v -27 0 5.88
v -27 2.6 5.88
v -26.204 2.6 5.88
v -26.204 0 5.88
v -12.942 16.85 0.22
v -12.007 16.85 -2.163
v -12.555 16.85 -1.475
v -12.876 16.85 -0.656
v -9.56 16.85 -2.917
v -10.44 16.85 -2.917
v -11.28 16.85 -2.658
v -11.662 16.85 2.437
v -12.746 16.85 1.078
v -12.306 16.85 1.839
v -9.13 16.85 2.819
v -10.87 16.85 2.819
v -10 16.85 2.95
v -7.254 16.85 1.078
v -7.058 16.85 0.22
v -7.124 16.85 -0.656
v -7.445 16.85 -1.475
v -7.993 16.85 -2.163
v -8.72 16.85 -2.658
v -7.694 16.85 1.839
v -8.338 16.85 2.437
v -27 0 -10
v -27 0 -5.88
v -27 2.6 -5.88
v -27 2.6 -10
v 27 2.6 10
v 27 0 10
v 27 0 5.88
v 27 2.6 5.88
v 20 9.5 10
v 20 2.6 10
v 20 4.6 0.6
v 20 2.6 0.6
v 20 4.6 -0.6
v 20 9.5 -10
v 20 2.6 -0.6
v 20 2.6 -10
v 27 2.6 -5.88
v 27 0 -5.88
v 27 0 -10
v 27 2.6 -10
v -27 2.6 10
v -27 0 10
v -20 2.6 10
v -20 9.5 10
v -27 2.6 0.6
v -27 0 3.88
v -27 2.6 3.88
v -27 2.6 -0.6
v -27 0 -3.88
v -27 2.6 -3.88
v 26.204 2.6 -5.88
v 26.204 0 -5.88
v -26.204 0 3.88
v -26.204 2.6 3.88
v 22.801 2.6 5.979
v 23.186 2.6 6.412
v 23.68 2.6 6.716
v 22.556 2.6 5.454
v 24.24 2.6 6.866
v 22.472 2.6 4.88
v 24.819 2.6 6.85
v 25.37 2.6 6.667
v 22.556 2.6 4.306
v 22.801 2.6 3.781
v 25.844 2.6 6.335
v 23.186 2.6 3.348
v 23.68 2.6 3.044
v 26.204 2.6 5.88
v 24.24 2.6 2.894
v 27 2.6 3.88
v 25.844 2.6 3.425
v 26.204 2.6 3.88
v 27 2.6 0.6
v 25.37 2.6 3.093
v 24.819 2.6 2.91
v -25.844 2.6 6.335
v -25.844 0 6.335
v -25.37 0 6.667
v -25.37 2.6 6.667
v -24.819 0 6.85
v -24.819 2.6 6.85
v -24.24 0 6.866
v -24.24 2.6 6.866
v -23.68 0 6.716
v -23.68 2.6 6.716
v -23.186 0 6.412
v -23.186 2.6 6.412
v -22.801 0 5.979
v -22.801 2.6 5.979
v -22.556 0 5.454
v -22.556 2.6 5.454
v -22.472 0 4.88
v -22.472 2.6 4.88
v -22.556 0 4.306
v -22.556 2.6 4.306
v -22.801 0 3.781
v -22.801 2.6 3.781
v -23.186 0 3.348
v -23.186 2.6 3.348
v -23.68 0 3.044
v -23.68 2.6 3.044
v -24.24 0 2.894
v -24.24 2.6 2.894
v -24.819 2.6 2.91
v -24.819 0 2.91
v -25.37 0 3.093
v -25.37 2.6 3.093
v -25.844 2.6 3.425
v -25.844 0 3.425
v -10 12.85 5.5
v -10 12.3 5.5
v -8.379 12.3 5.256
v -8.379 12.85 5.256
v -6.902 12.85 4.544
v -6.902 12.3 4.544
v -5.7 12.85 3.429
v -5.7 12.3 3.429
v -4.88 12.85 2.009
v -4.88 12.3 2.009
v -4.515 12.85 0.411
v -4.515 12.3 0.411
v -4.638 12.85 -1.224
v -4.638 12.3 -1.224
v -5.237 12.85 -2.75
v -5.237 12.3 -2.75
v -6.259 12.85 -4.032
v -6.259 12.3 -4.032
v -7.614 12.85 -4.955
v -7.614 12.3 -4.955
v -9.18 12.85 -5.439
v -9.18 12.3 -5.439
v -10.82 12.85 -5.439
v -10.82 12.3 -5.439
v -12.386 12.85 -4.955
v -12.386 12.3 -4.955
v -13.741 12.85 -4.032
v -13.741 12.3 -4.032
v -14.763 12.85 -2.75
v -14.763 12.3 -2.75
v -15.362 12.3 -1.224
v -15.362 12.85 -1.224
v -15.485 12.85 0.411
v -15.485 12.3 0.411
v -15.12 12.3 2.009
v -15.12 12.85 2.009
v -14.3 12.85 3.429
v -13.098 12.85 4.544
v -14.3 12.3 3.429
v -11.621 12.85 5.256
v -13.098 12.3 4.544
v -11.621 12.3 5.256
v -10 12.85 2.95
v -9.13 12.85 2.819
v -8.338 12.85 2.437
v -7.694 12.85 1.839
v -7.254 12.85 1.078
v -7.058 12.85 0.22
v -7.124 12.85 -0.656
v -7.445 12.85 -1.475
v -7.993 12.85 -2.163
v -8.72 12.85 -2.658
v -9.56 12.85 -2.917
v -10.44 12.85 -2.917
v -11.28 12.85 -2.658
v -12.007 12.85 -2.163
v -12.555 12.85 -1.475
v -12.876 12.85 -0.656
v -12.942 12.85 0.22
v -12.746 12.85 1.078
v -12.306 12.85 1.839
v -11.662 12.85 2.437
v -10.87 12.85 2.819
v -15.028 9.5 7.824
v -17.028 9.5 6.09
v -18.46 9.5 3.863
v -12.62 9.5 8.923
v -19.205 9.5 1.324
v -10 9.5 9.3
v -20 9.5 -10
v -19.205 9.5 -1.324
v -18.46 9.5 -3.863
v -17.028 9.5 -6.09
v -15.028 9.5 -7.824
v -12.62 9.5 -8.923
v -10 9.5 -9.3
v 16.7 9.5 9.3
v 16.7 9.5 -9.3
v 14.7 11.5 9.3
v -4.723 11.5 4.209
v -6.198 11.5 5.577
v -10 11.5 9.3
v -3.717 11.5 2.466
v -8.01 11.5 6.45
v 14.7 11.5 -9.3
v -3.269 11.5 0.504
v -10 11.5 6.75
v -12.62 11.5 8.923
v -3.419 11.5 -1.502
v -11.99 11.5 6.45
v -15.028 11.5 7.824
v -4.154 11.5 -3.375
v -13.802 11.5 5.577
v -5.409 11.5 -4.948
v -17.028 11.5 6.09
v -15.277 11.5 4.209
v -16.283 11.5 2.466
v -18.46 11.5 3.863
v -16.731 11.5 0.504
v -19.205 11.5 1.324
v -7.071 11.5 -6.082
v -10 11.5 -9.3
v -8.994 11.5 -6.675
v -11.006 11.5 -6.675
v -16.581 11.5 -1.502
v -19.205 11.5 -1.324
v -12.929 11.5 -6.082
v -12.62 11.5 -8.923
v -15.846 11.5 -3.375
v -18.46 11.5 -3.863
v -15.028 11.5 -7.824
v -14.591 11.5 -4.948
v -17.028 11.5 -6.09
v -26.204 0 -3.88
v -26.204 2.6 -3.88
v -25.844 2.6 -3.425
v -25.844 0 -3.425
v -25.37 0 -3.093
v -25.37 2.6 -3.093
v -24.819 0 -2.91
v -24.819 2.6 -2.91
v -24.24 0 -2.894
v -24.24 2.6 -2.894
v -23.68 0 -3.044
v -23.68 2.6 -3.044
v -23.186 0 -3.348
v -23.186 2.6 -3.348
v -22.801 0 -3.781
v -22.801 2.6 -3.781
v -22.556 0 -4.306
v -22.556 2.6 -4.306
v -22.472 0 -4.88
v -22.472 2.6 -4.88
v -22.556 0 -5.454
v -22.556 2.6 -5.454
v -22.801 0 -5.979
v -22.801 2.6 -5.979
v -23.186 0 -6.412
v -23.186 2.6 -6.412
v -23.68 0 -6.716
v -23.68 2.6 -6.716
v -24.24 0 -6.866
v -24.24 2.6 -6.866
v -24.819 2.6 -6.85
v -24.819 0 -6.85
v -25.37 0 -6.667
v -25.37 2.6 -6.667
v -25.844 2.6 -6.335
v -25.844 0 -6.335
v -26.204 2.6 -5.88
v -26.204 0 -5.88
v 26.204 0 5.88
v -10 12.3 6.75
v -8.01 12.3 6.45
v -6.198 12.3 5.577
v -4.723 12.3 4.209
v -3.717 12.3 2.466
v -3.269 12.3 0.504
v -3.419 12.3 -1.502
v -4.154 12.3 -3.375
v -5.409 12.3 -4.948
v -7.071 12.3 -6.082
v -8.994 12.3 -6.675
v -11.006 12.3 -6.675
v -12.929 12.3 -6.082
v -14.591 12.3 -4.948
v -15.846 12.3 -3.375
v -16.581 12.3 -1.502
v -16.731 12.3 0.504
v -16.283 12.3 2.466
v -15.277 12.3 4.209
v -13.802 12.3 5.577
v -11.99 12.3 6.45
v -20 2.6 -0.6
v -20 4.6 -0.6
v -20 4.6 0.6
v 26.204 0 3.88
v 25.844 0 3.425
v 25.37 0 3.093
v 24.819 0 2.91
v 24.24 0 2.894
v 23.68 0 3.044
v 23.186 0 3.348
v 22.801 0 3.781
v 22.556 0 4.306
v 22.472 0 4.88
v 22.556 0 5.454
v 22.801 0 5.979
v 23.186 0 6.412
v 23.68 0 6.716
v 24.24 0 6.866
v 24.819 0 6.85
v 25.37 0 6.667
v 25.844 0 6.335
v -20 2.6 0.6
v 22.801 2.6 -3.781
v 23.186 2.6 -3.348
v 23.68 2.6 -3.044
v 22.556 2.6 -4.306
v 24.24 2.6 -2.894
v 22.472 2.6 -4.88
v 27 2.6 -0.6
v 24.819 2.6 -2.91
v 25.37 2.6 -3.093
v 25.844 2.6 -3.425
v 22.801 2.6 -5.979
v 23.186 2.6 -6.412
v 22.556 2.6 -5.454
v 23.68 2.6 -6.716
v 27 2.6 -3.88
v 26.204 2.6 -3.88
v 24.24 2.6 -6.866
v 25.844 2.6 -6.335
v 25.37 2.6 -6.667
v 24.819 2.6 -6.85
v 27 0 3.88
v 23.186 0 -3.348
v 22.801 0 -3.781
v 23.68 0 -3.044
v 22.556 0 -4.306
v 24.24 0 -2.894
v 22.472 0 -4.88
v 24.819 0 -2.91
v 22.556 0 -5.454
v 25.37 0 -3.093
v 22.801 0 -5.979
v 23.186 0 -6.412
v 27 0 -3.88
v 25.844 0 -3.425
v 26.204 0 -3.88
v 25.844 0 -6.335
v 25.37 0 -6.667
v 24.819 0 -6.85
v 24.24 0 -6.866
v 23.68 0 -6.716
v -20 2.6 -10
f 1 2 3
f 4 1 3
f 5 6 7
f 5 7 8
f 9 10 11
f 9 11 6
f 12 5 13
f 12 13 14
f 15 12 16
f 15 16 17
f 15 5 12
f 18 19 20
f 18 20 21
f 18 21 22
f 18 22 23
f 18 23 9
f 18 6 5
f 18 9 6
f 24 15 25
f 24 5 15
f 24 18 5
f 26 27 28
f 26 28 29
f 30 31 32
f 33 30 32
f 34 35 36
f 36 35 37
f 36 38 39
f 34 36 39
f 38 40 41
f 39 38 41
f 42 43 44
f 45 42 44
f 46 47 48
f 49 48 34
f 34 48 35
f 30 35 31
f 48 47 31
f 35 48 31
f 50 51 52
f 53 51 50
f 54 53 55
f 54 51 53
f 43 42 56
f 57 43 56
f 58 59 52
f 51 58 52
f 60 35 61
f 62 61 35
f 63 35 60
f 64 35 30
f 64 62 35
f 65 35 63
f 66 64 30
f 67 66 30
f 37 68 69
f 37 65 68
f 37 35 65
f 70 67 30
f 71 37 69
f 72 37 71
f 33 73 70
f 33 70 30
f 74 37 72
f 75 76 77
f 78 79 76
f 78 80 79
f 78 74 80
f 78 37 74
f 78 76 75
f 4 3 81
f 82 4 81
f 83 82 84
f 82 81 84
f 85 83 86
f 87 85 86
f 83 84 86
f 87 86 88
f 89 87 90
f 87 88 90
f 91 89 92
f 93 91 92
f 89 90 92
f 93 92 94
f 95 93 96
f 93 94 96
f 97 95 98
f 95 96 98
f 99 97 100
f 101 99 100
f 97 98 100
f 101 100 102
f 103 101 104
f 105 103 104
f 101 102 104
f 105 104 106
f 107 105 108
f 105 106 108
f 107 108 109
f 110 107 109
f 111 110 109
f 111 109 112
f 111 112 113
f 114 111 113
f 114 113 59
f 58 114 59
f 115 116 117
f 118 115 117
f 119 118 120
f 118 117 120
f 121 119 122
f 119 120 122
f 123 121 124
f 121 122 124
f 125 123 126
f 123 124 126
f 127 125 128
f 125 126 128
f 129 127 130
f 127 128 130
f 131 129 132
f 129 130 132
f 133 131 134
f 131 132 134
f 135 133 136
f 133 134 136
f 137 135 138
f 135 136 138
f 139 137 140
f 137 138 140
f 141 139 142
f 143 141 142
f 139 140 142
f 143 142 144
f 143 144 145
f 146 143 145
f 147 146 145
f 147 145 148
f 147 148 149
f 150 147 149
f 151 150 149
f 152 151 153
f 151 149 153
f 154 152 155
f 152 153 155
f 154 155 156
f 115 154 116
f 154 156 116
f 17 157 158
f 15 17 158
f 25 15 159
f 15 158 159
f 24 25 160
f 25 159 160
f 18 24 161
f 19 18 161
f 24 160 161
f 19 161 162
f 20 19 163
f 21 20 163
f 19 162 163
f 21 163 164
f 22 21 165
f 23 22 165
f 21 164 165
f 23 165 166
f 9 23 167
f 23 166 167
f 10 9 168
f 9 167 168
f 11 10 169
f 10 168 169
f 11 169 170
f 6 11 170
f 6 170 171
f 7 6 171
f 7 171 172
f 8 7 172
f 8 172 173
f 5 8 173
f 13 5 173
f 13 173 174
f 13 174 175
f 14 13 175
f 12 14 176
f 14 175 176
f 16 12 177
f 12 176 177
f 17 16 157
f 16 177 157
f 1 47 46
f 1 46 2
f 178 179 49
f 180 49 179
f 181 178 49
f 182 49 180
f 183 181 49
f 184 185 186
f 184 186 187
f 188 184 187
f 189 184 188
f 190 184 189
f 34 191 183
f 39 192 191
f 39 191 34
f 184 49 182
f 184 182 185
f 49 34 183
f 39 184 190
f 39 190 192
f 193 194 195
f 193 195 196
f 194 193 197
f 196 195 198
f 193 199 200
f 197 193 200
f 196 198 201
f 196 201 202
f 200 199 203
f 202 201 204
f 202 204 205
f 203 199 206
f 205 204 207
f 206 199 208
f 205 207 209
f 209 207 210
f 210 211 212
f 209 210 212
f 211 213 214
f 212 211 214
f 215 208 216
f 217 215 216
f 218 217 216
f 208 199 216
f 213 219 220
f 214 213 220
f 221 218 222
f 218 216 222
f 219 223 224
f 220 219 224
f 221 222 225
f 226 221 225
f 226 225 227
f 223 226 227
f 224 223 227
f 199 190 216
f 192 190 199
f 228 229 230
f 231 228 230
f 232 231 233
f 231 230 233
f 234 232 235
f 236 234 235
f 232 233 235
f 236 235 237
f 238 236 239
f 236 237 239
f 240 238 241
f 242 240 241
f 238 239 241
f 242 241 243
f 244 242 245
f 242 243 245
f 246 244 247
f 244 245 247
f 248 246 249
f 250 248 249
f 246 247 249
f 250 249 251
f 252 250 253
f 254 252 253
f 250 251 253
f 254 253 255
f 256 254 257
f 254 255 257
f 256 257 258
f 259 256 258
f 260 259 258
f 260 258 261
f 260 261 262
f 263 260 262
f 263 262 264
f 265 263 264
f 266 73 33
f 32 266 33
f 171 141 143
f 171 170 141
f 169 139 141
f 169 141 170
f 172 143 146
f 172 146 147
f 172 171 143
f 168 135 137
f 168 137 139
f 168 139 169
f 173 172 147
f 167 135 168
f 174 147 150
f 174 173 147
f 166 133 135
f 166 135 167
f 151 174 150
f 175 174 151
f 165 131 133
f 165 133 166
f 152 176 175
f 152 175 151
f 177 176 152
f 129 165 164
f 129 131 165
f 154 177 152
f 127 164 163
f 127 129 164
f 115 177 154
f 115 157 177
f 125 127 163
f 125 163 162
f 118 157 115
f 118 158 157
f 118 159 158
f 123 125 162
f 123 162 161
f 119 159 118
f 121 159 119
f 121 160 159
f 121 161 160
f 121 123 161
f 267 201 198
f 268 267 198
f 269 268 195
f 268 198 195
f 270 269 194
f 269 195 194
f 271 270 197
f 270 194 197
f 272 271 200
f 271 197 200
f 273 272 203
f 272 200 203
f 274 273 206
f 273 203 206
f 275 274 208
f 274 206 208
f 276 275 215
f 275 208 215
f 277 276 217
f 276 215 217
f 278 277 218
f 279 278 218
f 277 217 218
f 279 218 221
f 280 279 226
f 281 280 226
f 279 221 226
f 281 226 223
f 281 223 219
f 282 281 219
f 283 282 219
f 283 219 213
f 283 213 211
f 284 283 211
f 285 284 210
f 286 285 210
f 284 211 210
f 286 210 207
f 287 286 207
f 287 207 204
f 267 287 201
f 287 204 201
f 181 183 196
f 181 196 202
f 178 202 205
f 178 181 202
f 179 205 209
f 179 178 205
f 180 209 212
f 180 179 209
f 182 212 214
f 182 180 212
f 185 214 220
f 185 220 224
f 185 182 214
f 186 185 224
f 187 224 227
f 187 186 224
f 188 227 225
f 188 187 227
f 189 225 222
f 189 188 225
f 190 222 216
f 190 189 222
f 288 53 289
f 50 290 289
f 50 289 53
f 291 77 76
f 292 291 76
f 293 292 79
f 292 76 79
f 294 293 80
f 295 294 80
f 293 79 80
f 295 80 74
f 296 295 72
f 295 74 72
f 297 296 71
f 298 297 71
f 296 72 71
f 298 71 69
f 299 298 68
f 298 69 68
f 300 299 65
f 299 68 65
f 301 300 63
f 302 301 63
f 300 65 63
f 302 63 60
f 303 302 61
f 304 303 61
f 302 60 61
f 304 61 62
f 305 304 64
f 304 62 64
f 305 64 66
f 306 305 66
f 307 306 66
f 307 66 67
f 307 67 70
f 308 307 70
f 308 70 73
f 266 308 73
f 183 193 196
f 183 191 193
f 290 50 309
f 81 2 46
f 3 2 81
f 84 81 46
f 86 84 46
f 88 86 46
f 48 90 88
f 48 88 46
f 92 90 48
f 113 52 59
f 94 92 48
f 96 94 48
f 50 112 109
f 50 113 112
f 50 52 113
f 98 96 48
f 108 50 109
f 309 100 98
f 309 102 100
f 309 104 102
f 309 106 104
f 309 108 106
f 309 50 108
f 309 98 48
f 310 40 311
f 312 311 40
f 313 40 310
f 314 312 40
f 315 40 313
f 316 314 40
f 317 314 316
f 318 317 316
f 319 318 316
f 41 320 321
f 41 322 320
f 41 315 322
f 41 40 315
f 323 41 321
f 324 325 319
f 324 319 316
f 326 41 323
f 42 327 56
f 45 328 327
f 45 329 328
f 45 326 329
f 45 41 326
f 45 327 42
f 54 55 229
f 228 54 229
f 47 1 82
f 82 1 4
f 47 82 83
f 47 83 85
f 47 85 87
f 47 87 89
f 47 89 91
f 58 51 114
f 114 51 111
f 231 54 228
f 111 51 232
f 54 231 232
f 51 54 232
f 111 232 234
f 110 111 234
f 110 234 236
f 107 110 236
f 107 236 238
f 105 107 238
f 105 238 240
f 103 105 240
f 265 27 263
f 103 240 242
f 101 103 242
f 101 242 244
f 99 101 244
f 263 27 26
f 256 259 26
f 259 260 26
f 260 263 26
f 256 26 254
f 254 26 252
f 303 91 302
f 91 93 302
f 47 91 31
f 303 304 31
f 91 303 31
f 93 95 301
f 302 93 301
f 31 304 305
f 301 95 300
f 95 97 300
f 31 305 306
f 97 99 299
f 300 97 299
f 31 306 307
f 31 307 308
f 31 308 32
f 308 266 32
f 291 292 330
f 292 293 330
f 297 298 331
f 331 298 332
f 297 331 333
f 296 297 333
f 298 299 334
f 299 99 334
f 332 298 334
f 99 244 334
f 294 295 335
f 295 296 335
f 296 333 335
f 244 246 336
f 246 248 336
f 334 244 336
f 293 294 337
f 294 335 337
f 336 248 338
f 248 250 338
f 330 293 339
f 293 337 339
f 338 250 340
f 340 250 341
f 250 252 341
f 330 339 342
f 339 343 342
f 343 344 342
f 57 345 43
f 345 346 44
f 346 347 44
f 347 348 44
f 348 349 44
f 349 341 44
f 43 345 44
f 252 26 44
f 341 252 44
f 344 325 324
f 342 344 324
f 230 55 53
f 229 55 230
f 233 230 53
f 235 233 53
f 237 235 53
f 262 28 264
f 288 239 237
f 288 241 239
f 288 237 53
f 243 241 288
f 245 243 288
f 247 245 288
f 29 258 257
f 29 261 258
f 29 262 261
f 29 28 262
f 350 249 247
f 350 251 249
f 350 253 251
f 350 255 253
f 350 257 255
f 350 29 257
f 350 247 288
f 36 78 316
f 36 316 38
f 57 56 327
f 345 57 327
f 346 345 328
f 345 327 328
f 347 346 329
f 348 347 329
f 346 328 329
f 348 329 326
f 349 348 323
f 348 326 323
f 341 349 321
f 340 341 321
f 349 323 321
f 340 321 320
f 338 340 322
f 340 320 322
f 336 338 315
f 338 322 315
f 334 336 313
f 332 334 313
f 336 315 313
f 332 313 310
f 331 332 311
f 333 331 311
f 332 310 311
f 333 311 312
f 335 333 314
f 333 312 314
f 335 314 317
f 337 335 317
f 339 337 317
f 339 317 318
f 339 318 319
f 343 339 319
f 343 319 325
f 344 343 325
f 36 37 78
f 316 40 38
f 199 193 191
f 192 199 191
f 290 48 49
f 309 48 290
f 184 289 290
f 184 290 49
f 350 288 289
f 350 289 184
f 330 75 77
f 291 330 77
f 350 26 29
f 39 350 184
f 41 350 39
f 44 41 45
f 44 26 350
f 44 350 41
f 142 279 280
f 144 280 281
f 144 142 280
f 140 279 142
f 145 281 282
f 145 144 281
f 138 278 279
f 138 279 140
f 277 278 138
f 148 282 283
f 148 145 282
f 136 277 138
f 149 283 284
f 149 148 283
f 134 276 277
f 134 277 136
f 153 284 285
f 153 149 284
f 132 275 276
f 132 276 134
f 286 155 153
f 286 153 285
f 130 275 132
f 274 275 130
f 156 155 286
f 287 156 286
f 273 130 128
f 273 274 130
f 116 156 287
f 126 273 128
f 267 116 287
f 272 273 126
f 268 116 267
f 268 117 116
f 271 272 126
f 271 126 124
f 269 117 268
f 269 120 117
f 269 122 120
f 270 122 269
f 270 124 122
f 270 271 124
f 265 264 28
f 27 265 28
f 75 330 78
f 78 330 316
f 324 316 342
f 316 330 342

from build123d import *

# Parameters (mm, degrees)
CROQUIS_BASE_W           = 54
CROQUIS_BASE_H           = 20
SALIENTE_EXTRUIR1_DEPTH  = 2.6
CORTAR_EXTRUIR1_DEPTH    = 2.6
CROQUIS_STEP_2_3_W       = 40
CROQUIS_STEP_2_3_H       = 20
SALIENTE_EXTRUIR2_DEPTH  = 6.9
SALIENTE_EXTRUIR5_DEPTH  = 2
CROQUIS5_W               = 7
CROQUIS5_H               = 1.2
SALIENTE_EXTRUIR6_DEPTH  = 2
CROQUIS3_W               = 7
CROQUIS3_H               = 1.2
SALIENTE_EXTRUIR7_DEPTH  = 2
CORTAR_EXTRUIR4_DEPTH    = 1.2
CORTAR_EXTRUIR5_DEPTH    = 1.2
CROQUIS10_R              = 6.75
SALIENTE_EXTRUIR8_DEPTH  = 0.8
CROQUIS11_R              = 5.5
SALIENTE_EXTRUIR9_DEPTH  = 0.55
CHAFL_N1_START           = 18.526197667
CHAFL_N1_OUTLINE_W       = 2.828427125
CHAFL_N1_OUTLINE_H       = 18.6
CHAFL_N1_DEPTH           = 2.473802333
CROQUIS12_R              = 2.95
SALIENTE_EXTRUIR10_DEPTH = 4


with BuildPart() as part:
    # Croquis base → Saliente-Extruir1 (new body)
    with BuildSketch(Plane(origin=(0, 0, 0), x_dir=(1, 0, 0), z_dir=(0, 1, 0))):
        Rectangle(CROQUIS_BASE_W, CROQUIS_BASE_H)
    extrude(amount=SALIENTE_EXTRUIR1_DEPTH)

    # Croquis step 2 → Cortar-Extruir1 (cut)
    with BuildSketch(Plane(origin=(0, 2.6, 0), x_dir=(1, 0, 0), z_dir=(0, 1, 0))):
        with BuildLine():
            Line((-26.204050808, 5.88), (-27, 5.88))
            Line((-27, 5.88), (-27, 3.88))
            Line((-27, 3.88), (-26.204050808, 3.88))
            ThreePointArc((-26.204050808, 3.88), (-22.472, 4.88), (-26.204050808, 5.88))
        make_face()
        with BuildLine():
            Line((-26.204050808, -3.88), (-27, -3.88))
            Line((-27, -3.88), (-27, -5.88))
            Line((-27, -5.88), (-26.204050808, -5.88))
            ThreePointArc((-26.204050808, -5.88), (-22.472, -4.88), (-26.204050808, -3.88))
        make_face()
        with BuildLine():
            Line((26.204050808, 3.88), (27, 3.88))
            Line((27, 3.88), (27, 5.88))
            Line((27, 5.88), (26.204050808, 5.88))
            ThreePointArc((26.204050808, 5.88), (22.472, 4.88), (26.204050808, 3.88))
        make_face()
        with BuildLine():
            Line((26.204050808, -5.88), (27, -5.88))
            Line((27, -5.88), (27, -3.88))
            Line((27, -3.88), (26.204050808, -3.88))
            ThreePointArc((26.204050808, -3.88), (22.472, -4.88), (26.204050808, -5.88))
        make_face()
    extrude(amount=-CORTAR_EXTRUIR1_DEPTH, mode=Mode.SUBTRACT)

    # Croquis step 2<3> → Saliente-Extruir2 (add)
    with BuildSketch(Plane(origin=(0, 2.6, 0), x_dir=(1, 0, 0), z_dir=(0, 1, 0))):
        Rectangle(CROQUIS_STEP_2_3_W, CROQUIS_STEP_2_3_H)
    extrude(amount=SALIENTE_EXTRUIR2_DEPTH)

    # Croquis7 → Saliente-Extruir5 (add)
    with BuildSketch(Plane(origin=(0, 9.5, 0), x_dir=(1, 0, 0), z_dir=(0, 1, 0))):
        with BuildLine():
            Line((-10, 9.3), (16.7, 9.3))
            Line((16.7, 9.3), (16.7, -9.3))
            Line((16.7, -9.3), (-10, -9.3))
            ThreePointArc((-10, -9.3), (-19.3, 0), (-10, 9.3))
        make_face()
    extrude(amount=SALIENTE_EXTRUIR5_DEPTH)

    # Croquis5 → Saliente-Extruir6 (add)
    with BuildSketch(Plane(origin=(0, 2.6, 0), x_dir=(1, 0, 0), z_dir=(0, 1, 0))):
        with Locations((23.5, 0)):
            Rectangle(CROQUIS5_W, CROQUIS5_H)
    extrude(amount=SALIENTE_EXTRUIR6_DEPTH)

    # Croquis3 → Saliente-Extruir7 (add)
    with BuildSketch(Plane(origin=(0, 2.6, 0), x_dir=(1, 0, 0), z_dir=(0, 1, 0))):
        with Locations((-23.5, 0)):
            Rectangle(CROQUIS3_W, CROQUIS3_H)
    extrude(amount=SALIENTE_EXTRUIR7_DEPTH)

    # Croquis8 → Cortar-Extruir4 (cut)
    with BuildSketch(Plane.XY.offset(0.6)):
        Polygon((-27, 2.6), (-27, 4.6), (-20, 4.6), align=None)
    extrude(amount=-CORTAR_EXTRUIR4_DEPTH, mode=Mode.SUBTRACT)

    # Croquis9 → Cortar-Extruir5 (cut)
    with BuildSketch(Plane.XY.offset(0.6)):
        Polygon((27, 2.6), (20, 4.6), (27, 4.6), align=None)
    extrude(amount=-CORTAR_EXTRUIR5_DEPTH, mode=Mode.SUBTRACT)

    # Croquis10 → Saliente-Extruir8 (add)
    with BuildSketch(Plane(origin=(0, 11.5, 0), x_dir=(1, 0, 0), z_dir=(0, 1, 0))):
        with Locations(Location((-10, 0, 0), (0, 0, 270))):
            Circle(CROQUIS10_R)
    extrude(amount=SALIENTE_EXTRUIR8_DEPTH)

    # Croquis11 → Saliente-Extruir9 (add)
    with BuildSketch(Plane(origin=(0, 12.3, 0), x_dir=(1, 0, 0), z_dir=(0, 1, 0))):
        with Locations(Location((-10, 0, 0), (0, 0, 270))):
            Circle(CROQUIS11_R)
    extrude(amount=SALIENTE_EXTRUIR9_DEPTH)

    # Chaflán1: read off the stored shape, not the designer's step
    # Chaflán1 outline → Chaflán1 (cut)
    with BuildSketch(Plane(origin=(0, 0, 0), x_dir=(0.707106781186548, -0.707106781186547, 0), z_dir=(0.707106781186547, 0.707106781186548, 0)).offset(CHAFL_N1_START)):
        with Locations((3.676955263, 0)):
            Rectangle(CHAFL_N1_OUTLINE_W, CHAFL_N1_OUTLINE_H)
    extrude(amount=CHAFL_N1_DEPTH, mode=Mode.SUBTRACT)

    # Croquis12 → Saliente-Extruir10 (add)
    with BuildSketch(Plane(origin=(0, 12.85, 0), x_dir=(1, 0, 0), z_dir=(0, 1, 0))):
        with Locations(Location((-10, 0, 0), (0, 0, 270))):
            Circle(CROQUIS12_R)
    extrude(amount=SALIENTE_EXTRUIR10_DEPTH)


solid = part.part
